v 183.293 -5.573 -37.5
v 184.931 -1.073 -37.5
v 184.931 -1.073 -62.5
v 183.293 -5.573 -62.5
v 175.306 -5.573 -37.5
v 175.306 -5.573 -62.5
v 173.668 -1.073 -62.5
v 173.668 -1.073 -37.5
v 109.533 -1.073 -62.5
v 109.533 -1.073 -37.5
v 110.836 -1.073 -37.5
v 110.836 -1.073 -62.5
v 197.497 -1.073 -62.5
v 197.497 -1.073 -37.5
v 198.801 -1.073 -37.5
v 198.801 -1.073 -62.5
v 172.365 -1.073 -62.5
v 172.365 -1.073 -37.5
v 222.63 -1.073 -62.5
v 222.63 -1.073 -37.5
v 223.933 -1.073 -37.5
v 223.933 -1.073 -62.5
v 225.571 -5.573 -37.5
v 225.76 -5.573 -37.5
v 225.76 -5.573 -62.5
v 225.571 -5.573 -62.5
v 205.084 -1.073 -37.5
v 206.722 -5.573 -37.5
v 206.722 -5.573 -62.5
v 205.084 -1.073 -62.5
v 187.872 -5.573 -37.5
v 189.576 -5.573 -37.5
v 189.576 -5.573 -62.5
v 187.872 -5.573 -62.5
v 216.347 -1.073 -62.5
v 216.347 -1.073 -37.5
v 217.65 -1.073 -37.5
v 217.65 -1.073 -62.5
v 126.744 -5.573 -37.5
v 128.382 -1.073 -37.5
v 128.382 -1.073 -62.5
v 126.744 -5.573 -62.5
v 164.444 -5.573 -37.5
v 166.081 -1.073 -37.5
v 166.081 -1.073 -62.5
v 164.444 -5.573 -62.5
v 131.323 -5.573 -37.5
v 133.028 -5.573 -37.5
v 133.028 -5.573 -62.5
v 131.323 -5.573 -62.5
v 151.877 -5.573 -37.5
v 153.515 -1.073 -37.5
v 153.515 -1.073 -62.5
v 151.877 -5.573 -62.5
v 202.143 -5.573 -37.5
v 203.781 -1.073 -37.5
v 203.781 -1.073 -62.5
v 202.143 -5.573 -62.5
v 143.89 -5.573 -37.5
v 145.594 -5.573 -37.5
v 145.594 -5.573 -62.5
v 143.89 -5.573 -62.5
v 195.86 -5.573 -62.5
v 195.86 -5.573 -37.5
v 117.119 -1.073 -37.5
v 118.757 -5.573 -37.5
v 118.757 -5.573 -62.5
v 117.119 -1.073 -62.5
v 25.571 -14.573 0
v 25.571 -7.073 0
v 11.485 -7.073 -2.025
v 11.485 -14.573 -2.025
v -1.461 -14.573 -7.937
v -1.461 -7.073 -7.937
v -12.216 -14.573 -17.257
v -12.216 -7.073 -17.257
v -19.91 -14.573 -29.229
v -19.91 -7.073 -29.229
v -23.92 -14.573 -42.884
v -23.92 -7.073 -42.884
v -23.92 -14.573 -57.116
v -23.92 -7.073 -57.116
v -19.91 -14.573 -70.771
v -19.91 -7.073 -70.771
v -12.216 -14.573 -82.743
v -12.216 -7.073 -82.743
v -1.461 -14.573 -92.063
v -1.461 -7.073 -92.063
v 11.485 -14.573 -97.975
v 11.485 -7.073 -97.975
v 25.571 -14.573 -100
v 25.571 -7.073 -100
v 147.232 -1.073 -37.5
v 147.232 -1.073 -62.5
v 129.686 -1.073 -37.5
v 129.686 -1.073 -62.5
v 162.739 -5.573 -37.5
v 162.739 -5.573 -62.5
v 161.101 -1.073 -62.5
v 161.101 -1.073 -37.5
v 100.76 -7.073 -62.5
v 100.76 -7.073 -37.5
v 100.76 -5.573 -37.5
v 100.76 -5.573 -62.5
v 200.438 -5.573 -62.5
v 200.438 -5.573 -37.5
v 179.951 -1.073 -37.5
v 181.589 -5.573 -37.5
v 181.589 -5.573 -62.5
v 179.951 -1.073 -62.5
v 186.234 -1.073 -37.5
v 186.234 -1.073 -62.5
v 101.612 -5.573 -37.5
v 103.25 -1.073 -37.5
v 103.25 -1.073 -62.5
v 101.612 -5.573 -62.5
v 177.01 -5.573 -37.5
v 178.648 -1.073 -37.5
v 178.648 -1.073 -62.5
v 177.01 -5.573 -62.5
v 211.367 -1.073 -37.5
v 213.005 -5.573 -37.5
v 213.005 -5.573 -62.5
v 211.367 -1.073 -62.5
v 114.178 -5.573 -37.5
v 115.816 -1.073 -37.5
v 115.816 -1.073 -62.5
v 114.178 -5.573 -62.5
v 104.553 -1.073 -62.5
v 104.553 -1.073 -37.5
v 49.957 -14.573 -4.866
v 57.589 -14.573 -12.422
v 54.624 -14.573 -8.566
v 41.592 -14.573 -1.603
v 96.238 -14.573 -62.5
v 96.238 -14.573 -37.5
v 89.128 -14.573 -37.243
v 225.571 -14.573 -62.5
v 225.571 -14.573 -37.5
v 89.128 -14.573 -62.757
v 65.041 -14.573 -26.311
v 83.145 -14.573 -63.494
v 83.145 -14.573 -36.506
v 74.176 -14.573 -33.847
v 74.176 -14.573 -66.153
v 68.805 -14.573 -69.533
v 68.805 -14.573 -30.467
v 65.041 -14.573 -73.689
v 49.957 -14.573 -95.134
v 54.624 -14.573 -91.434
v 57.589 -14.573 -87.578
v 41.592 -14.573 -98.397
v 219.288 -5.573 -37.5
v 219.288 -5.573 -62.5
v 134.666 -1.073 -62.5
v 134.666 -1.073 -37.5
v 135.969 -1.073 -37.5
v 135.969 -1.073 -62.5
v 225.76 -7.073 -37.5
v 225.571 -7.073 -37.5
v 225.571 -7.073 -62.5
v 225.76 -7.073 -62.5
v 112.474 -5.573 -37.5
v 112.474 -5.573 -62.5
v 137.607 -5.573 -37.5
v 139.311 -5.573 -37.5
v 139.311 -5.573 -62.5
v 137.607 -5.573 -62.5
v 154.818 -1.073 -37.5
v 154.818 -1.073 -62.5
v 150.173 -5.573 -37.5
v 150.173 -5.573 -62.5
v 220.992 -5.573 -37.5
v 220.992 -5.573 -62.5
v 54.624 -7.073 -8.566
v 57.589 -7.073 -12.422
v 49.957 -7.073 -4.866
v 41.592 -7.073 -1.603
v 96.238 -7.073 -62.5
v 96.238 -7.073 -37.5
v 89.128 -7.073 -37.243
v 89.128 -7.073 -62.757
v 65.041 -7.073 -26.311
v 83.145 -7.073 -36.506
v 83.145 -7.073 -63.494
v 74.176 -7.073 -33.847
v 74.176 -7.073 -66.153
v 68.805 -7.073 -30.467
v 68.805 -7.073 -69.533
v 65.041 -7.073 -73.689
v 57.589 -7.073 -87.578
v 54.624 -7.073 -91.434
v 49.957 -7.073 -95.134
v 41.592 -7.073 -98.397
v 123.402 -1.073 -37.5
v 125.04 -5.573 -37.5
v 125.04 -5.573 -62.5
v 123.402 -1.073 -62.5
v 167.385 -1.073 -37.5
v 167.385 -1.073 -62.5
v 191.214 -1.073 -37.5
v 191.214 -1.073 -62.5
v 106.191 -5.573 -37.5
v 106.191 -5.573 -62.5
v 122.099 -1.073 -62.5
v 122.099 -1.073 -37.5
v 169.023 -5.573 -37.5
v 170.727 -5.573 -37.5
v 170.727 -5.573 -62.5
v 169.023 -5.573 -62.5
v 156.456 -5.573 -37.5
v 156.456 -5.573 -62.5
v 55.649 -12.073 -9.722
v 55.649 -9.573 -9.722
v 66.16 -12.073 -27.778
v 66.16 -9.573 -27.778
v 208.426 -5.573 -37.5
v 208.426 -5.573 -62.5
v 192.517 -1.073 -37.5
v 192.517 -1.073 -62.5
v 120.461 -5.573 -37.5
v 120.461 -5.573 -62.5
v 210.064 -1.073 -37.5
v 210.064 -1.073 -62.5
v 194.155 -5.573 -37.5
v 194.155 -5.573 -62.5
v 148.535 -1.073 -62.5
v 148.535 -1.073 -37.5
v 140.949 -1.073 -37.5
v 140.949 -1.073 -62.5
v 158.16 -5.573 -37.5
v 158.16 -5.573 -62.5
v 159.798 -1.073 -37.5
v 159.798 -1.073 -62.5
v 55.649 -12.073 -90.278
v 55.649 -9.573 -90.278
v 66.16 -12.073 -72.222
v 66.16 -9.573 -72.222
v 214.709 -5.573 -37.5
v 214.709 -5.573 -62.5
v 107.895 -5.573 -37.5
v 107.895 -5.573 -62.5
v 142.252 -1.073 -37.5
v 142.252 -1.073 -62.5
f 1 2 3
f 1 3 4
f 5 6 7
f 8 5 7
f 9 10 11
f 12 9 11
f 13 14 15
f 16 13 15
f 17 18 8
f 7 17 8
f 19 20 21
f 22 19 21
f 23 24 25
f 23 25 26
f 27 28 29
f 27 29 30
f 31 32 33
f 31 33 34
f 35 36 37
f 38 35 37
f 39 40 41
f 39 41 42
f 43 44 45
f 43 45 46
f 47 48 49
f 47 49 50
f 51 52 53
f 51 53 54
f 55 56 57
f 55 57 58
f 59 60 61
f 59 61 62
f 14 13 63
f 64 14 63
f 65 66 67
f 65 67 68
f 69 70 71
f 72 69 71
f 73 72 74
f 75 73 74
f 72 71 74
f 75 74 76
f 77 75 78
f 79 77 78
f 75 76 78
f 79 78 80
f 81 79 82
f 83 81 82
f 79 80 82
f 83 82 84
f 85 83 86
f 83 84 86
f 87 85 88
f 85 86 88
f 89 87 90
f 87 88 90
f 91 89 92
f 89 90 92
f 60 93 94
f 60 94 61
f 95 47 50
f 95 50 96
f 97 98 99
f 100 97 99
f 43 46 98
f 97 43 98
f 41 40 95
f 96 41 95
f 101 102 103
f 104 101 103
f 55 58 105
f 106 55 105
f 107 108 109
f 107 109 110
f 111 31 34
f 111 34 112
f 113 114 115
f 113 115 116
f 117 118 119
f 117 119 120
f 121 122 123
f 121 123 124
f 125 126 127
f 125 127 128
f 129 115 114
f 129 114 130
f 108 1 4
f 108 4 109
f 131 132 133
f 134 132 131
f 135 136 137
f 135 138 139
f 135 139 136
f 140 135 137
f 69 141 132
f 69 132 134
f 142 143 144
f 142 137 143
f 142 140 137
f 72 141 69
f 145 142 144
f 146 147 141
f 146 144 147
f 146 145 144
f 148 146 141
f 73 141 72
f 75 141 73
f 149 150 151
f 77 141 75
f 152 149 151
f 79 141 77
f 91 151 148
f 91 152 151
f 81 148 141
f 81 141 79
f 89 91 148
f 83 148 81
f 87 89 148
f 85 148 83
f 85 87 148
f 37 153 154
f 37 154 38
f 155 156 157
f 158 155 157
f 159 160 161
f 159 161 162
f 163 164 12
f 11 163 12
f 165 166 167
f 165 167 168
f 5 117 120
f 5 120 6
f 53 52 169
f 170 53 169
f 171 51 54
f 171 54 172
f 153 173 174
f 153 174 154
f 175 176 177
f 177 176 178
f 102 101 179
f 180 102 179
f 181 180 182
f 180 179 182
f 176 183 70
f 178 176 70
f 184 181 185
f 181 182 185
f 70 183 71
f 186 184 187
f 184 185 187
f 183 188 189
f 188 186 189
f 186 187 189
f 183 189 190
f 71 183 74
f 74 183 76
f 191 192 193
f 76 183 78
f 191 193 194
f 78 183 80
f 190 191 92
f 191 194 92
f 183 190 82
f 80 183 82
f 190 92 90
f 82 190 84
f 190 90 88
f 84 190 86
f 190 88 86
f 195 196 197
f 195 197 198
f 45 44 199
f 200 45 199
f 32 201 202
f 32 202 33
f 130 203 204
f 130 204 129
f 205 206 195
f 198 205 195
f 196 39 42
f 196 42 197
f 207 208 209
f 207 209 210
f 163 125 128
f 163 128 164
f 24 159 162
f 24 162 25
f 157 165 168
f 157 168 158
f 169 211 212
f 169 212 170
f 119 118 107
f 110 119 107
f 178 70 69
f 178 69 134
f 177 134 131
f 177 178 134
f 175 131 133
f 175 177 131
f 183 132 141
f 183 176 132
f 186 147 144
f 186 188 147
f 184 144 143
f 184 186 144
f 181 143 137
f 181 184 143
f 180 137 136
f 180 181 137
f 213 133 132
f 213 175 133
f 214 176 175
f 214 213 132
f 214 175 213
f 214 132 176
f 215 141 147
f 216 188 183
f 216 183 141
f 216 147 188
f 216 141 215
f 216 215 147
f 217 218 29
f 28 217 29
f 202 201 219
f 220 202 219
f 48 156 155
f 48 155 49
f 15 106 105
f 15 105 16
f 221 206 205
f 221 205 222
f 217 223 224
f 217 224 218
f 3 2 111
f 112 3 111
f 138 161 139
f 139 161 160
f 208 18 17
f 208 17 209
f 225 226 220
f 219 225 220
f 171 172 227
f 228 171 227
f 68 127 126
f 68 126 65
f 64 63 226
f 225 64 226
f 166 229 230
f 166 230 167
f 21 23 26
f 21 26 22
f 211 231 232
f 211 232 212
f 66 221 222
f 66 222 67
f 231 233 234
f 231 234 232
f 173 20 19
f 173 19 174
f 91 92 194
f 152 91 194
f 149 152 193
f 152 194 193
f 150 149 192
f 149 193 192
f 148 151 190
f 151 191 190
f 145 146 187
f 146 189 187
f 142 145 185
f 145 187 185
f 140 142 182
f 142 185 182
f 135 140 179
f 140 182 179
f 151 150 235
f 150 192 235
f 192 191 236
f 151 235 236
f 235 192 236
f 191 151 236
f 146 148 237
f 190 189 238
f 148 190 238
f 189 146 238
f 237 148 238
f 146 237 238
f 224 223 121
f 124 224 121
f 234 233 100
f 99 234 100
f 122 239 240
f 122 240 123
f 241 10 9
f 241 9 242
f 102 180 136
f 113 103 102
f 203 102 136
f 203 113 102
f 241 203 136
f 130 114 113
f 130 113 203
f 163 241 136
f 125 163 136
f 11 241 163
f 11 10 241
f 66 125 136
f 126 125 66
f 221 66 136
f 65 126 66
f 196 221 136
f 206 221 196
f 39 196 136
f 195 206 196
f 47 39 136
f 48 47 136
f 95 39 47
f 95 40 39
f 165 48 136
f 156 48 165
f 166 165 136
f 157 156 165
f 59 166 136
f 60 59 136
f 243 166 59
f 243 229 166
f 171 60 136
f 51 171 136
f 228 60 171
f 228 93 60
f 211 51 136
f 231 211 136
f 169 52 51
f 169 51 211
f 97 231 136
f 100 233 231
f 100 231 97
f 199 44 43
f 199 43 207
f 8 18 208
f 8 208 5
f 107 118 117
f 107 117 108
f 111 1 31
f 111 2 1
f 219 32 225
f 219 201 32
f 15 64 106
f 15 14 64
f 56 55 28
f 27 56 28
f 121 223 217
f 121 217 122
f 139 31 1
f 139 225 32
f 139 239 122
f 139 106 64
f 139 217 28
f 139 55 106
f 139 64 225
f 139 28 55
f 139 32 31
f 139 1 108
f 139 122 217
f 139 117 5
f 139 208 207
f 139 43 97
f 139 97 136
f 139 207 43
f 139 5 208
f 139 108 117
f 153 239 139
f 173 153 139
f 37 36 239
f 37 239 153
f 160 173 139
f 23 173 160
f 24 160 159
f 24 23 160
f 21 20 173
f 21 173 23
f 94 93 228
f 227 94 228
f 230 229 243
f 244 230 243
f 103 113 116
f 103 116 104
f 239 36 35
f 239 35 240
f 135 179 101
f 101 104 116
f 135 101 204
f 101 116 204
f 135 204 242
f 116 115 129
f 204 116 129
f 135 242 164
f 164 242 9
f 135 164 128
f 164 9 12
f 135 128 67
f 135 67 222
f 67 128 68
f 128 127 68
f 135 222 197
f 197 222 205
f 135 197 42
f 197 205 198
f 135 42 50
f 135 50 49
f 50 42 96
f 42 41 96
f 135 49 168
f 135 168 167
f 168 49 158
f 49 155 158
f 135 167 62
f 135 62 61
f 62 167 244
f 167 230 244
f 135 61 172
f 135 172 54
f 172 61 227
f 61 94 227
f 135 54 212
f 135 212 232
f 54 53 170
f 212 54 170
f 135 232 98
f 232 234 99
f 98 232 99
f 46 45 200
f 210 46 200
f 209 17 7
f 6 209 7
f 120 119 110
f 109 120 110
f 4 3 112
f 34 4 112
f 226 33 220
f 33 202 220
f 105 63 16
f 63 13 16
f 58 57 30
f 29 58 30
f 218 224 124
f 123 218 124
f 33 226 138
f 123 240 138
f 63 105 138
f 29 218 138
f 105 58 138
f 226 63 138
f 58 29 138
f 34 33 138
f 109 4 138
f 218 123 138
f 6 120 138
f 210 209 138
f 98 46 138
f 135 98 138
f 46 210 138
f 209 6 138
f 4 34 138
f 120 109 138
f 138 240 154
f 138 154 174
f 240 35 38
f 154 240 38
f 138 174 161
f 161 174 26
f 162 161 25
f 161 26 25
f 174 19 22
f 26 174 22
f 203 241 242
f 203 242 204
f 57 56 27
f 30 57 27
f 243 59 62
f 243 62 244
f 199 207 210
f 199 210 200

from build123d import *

# Parameters (mm, degrees)
BLANKSKE_W          = 500
BLANKSKE_H          = 24
BLANK_DEPTH         = 100
TOOTHCUTSIM_DEPTH   = 511.466453354
TEETHCUTS_COUNT     = 21
TEETHCUTS_PITCH     = 25.1327412
SKETCH1_W           = 800
SKETCH1_H           = 100
BOSS_EXTRUDE1_DEPTH = 30
SCALE1_SCALE        = 0.25
BOSS_EXTRUDE2_DEPTH = 7.5


with BuildPart() as part:
    # BlankSke → Blank (new body)
    with BuildSketch(Plane.XY):
        with Locations((250, 12)):
            Rectangle(BLANKSKE_W, BLANKSKE_H)
    extrude(amount=-BLANK_DEPTH)

    # TooCutSkeSim → ToothCutSim (cut, through all)
    with BuildSketch(Plane.XY):
        Polygon((3.408482957, 6), (-3.408482957, 6), (-9.969192018, 24.0254), (9.969192018, 24.0254), align=None)
    toothcutsim = extrude(amount=-TOOTHCUTSIM_DEPTH, mode=Mode.SUBTRACT)

    # TeethCuts: ToothCutSim ×21
    with Locations(*[(i * TEETHCUTS_PITCH, 0, 0) for i in range(1, TEETHCUTS_COUNT)]):
        add(toothcutsim, mode=Mode.SUBTRACT)

    # Sketch1 → Boss-Extrude1 (add)
    with BuildSketch(Plane.XZ):
        with Locations((99.246341043, -50)):
            Rectangle(SKETCH1_W, SKETCH1_H)
    extrude(amount=BOSS_EXTRUDE1_DEPTH)


with BuildPart() as part_1:
    # Scale1: scaled about (134.34613588, -9.4300262, -50)
    add(part.part.scale(SCALE1_SCALE).moved(Location((100.75960191, -7.07251965, -37.5))))

    # Sketch3 → Boss-Extrude2 (add)
    with BuildSketch(Plane(origin=(0, -7.07251965, 0), x_dir=(1, 0, 0), z_dir=(0, 1, 0))):
        with BuildLine():
            Line((96.237657296, 62.5), (25.57118717, 62.5))
            Line((25.57118717, 62.5), (25.57118717, 37.5))
            Line((25.57118717, 37.5), (96.237657296, 37.5))
            add(Edge.make_bspline(
                [(25.57118717, 0), (78.47502041, 0), (43.333824056, 37.5), (96.237657296, 37.5)],
                knots=[0, 0, 0, 0, 1, 1, 1, 1], degree=3))
            ThreePointArc((25.57118717, 0), (-24.42881283, 50), (25.57118717, 100))
            add(Edge.make_bspline(
                [(25.57118717, 100), (78.47502041, 100), (43.333824056, 62.5), (96.237657296, 62.5)],
                knots=[0, 0, 0, 0, 1, 1, 1, 1], degree=3))
        make_face()
    extrude(amount=-BOSS_EXTRUDE2_DEPTH)


solid = part_1.part
